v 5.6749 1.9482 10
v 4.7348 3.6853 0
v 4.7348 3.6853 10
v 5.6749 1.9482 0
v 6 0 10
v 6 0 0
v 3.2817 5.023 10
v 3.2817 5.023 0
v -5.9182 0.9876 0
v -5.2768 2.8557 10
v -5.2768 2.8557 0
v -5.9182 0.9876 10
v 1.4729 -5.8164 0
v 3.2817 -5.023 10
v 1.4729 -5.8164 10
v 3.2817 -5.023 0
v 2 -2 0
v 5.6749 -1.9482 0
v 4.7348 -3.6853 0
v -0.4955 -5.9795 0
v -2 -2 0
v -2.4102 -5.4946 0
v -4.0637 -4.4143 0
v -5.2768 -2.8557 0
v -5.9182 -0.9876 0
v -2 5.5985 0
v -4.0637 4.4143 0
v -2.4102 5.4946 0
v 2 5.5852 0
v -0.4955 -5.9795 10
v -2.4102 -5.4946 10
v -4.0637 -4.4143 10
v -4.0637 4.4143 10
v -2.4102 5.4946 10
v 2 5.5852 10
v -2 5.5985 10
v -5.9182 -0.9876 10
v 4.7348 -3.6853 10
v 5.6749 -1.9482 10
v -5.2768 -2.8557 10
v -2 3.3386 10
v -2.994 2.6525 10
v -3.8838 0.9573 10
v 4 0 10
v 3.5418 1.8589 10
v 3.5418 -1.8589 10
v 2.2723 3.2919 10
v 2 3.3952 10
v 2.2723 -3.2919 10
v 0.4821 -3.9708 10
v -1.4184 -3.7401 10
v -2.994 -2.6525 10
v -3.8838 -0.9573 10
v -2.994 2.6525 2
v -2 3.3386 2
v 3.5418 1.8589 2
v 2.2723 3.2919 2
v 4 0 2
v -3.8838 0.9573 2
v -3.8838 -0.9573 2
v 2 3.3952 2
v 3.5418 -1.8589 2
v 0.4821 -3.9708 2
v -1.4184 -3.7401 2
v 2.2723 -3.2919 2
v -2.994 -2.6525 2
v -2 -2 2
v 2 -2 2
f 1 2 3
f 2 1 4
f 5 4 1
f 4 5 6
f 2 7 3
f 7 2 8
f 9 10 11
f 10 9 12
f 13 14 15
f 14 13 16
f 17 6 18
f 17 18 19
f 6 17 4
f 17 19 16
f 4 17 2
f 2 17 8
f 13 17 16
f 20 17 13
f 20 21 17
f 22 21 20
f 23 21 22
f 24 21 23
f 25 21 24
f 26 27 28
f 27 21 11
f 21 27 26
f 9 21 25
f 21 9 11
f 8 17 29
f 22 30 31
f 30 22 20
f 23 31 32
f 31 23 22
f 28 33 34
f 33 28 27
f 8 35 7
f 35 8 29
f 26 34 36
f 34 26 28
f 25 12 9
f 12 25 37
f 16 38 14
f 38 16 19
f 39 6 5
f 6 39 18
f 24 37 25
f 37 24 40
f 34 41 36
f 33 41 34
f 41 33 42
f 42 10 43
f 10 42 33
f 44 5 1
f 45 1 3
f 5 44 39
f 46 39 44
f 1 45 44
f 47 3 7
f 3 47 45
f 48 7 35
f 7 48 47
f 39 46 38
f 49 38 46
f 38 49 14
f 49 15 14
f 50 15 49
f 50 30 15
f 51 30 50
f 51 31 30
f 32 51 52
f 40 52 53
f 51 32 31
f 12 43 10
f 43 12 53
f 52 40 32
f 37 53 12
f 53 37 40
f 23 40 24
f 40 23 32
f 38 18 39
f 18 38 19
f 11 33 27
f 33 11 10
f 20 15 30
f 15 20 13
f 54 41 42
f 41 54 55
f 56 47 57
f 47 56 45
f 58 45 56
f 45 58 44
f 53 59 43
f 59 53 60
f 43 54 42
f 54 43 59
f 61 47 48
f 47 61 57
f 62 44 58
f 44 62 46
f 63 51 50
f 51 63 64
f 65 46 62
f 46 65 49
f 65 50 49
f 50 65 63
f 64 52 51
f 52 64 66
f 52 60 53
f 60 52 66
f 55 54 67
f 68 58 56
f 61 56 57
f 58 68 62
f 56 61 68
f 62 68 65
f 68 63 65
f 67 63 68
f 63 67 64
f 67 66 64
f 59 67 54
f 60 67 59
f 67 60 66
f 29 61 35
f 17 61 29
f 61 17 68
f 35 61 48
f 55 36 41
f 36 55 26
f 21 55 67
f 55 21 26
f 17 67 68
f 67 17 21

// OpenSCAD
difference() {
    cylinder(d=12, 10);
    translate([0,0,2])
        cylinder(d=8, 10);
    translate([-2,-2,0])
    cube([4,12,12]);
}
